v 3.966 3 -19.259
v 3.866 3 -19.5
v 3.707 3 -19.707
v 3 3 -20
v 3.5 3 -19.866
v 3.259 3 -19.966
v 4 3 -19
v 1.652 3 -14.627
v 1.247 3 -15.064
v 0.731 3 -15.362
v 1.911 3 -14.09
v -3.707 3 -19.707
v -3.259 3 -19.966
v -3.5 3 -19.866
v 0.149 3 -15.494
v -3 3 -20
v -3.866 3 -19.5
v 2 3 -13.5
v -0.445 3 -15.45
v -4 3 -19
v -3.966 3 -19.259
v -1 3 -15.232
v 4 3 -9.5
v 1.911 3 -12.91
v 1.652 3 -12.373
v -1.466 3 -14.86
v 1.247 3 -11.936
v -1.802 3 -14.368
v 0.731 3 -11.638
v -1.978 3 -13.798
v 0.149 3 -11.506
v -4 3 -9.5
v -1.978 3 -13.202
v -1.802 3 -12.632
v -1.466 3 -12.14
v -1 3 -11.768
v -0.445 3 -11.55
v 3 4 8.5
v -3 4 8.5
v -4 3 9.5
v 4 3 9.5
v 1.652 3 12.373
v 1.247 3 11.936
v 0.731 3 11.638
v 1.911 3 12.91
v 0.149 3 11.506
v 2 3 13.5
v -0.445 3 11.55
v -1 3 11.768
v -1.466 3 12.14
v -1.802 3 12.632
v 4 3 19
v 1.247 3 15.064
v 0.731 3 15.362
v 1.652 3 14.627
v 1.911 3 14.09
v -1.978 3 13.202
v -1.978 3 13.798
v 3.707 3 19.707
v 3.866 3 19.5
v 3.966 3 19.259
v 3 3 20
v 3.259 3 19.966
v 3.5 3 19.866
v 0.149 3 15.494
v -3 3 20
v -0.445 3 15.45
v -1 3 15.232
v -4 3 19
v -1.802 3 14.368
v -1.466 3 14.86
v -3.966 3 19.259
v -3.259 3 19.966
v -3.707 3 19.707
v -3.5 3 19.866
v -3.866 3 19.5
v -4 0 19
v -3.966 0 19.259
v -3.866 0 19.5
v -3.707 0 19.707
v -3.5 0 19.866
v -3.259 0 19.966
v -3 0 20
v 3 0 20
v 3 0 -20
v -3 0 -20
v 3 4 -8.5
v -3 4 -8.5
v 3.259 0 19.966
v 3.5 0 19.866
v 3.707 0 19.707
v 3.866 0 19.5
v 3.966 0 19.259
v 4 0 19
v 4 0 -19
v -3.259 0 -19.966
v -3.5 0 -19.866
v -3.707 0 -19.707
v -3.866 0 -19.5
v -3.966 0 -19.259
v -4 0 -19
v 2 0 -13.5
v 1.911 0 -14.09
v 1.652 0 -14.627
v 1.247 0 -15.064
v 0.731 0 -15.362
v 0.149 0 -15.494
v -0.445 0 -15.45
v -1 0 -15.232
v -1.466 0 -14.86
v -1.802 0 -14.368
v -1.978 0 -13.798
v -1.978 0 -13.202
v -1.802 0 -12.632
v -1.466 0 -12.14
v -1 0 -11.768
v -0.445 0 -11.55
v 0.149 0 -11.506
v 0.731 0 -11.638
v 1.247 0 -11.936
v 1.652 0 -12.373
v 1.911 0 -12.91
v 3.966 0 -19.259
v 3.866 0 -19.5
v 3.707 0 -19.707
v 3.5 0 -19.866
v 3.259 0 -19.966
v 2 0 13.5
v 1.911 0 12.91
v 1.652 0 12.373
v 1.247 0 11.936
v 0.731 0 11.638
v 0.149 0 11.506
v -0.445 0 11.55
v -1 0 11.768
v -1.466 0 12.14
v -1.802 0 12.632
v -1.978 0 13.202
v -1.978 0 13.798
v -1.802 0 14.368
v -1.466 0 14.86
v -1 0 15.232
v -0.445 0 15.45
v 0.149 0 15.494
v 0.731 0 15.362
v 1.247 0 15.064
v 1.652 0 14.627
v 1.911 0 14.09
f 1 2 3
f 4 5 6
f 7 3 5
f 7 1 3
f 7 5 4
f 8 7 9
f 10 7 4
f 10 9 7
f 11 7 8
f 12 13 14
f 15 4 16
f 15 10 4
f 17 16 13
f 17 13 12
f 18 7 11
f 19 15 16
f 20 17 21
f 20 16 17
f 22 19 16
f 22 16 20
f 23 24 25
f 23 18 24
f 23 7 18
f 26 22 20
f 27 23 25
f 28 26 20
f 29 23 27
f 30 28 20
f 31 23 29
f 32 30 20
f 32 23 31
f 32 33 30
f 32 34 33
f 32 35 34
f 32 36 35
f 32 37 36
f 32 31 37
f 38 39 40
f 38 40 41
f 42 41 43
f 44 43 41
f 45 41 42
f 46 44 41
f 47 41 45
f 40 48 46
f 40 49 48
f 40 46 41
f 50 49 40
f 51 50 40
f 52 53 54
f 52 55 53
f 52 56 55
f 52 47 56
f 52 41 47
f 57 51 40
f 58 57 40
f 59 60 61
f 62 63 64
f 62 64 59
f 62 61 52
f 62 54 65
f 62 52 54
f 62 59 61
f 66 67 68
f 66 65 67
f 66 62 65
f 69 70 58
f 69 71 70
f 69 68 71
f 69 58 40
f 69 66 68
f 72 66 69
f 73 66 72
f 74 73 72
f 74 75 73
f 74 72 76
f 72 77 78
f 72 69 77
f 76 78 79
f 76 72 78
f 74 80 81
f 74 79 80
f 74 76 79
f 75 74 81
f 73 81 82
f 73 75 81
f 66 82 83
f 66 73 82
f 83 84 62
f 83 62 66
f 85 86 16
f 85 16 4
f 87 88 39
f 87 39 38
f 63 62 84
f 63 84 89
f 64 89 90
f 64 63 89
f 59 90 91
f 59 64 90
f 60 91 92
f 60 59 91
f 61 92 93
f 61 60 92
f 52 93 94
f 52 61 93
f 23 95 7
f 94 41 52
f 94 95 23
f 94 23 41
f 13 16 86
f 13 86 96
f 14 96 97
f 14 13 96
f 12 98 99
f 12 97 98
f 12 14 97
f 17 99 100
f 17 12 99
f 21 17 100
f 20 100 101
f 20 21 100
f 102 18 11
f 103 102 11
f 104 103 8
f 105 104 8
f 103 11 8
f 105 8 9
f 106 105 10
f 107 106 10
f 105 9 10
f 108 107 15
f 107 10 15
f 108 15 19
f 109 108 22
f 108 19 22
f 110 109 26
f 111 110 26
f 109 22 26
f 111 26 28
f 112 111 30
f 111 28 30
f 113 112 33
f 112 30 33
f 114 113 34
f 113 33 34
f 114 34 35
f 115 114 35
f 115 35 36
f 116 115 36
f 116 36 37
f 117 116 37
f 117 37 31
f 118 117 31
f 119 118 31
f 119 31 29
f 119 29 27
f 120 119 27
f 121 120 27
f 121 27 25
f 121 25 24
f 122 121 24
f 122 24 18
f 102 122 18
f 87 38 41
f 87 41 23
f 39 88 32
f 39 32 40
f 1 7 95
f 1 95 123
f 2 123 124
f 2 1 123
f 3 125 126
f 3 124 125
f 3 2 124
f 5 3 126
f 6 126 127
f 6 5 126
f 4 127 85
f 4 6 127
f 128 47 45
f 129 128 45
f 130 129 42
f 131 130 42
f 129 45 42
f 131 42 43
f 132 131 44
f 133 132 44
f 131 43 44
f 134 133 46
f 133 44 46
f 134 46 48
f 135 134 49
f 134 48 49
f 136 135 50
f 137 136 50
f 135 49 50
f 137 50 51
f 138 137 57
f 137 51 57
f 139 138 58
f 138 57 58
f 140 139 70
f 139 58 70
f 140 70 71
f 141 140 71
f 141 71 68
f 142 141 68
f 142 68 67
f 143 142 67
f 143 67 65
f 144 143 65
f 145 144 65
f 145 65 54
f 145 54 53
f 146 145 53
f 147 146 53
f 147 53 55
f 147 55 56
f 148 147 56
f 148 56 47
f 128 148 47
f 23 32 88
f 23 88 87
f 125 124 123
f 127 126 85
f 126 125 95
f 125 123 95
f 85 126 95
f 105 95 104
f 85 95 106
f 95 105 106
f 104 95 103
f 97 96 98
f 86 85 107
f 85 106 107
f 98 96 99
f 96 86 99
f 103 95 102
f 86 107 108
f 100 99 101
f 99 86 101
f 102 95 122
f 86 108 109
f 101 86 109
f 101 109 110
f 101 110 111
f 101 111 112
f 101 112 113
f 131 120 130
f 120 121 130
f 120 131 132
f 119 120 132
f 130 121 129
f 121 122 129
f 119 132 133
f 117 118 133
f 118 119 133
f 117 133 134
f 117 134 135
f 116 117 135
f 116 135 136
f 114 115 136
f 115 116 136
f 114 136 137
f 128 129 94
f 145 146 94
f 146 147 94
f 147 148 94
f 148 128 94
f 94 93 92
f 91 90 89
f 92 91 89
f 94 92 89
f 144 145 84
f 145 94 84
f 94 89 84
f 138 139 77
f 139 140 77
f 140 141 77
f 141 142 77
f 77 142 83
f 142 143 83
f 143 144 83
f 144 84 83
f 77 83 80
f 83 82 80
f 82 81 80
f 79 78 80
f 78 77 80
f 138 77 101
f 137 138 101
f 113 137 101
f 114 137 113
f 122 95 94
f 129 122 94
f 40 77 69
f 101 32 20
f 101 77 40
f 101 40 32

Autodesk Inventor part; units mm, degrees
ref_plane "YZ Plane" through (0, 0, 0) normal (1, 0, 0) x (0, 1, 0)
ref_plane "XZ Plane" through (0, 0, 0) normal (0, 1, 0) x (-1, 0, 0)
ref_plane "XY Plane" through (0, 0, 0) normal (0, 0, 1) x (1, 0, 0)
sketch "Sketch1" plane through (0, 0, 0) normal (0, 1, 0) x (-1, 0, 0)
  line L0 (-4, 20) -> (4, 20)
  line L1 (4, 20) -> (4, -20)
  line L2 (4, -20) -> (-4, -20)
  line L3 (-4, -20) -> (-4, 20)
  line L4 (-4, 20) -> (4, -20) construction
  line L5 (4, 20) -> (-4, -20) construction
  point P0 (0, 0)
  dimension "d0" = 8
  dimension "d1" = 40
extrude "Extrusion1" add sketch "Sketch1" along normal blind 3
fillet "Fillet1" radius 1 4 edges at (4, 1.5, 20) (-4, 1.5, 20) (4, 1.5, -20) (-4, 1.5, -20)
sketch "Sketch2" plane through (0, 3, 0) normal (0, 1, 0) x (1, 0, 0)
  line L0 (0, 0) -> (0, -13.5) construction
  line L1 (0, 0) -> (0, 13.5) construction
  circle A0 centre (0, -13.5) radius 2
  circle A1 centre (0, 13.5) radius 2
  dimension "d5" = 13.5
  dimension "d6" = 13.5
  dimension "d7" = 4
  dimension "d8" = 4
extrude "Extrusion2" cut sketch "Sketch2" against normal up to surface (3 mm away)
sketch "Sketch3" plane through (0, 3, 0) normal (0, 1, 0) x (1, 0, 0)
  line L0 (-4, 9.5) -> (4, 9.5)
  line L1 (4, 9.5) -> (4, -9.5)
  line L2 (4, -9.5) -> (-4, -9.5)
  line L3 (-4, -9.5) -> (-4, 9.5)
  line L4 (-4, 9.5) -> (4, -9.5) construction
  line L5 (4, 9.5) -> (-4, -9.5) construction
  point P0 (0, 0)
  dimension "d11" = 8
  dimension "d12" = 19
extrude "Extrusion3" add sketch "Sketch3" along normal blind 1
chamfer "Chamfer1" distance 1 angle 45 4 edges at (0, 4, 9.5) (0, 4, -9.5) (4, 4, 0) (-4, 4, 0)
properties part number "load_cell"
